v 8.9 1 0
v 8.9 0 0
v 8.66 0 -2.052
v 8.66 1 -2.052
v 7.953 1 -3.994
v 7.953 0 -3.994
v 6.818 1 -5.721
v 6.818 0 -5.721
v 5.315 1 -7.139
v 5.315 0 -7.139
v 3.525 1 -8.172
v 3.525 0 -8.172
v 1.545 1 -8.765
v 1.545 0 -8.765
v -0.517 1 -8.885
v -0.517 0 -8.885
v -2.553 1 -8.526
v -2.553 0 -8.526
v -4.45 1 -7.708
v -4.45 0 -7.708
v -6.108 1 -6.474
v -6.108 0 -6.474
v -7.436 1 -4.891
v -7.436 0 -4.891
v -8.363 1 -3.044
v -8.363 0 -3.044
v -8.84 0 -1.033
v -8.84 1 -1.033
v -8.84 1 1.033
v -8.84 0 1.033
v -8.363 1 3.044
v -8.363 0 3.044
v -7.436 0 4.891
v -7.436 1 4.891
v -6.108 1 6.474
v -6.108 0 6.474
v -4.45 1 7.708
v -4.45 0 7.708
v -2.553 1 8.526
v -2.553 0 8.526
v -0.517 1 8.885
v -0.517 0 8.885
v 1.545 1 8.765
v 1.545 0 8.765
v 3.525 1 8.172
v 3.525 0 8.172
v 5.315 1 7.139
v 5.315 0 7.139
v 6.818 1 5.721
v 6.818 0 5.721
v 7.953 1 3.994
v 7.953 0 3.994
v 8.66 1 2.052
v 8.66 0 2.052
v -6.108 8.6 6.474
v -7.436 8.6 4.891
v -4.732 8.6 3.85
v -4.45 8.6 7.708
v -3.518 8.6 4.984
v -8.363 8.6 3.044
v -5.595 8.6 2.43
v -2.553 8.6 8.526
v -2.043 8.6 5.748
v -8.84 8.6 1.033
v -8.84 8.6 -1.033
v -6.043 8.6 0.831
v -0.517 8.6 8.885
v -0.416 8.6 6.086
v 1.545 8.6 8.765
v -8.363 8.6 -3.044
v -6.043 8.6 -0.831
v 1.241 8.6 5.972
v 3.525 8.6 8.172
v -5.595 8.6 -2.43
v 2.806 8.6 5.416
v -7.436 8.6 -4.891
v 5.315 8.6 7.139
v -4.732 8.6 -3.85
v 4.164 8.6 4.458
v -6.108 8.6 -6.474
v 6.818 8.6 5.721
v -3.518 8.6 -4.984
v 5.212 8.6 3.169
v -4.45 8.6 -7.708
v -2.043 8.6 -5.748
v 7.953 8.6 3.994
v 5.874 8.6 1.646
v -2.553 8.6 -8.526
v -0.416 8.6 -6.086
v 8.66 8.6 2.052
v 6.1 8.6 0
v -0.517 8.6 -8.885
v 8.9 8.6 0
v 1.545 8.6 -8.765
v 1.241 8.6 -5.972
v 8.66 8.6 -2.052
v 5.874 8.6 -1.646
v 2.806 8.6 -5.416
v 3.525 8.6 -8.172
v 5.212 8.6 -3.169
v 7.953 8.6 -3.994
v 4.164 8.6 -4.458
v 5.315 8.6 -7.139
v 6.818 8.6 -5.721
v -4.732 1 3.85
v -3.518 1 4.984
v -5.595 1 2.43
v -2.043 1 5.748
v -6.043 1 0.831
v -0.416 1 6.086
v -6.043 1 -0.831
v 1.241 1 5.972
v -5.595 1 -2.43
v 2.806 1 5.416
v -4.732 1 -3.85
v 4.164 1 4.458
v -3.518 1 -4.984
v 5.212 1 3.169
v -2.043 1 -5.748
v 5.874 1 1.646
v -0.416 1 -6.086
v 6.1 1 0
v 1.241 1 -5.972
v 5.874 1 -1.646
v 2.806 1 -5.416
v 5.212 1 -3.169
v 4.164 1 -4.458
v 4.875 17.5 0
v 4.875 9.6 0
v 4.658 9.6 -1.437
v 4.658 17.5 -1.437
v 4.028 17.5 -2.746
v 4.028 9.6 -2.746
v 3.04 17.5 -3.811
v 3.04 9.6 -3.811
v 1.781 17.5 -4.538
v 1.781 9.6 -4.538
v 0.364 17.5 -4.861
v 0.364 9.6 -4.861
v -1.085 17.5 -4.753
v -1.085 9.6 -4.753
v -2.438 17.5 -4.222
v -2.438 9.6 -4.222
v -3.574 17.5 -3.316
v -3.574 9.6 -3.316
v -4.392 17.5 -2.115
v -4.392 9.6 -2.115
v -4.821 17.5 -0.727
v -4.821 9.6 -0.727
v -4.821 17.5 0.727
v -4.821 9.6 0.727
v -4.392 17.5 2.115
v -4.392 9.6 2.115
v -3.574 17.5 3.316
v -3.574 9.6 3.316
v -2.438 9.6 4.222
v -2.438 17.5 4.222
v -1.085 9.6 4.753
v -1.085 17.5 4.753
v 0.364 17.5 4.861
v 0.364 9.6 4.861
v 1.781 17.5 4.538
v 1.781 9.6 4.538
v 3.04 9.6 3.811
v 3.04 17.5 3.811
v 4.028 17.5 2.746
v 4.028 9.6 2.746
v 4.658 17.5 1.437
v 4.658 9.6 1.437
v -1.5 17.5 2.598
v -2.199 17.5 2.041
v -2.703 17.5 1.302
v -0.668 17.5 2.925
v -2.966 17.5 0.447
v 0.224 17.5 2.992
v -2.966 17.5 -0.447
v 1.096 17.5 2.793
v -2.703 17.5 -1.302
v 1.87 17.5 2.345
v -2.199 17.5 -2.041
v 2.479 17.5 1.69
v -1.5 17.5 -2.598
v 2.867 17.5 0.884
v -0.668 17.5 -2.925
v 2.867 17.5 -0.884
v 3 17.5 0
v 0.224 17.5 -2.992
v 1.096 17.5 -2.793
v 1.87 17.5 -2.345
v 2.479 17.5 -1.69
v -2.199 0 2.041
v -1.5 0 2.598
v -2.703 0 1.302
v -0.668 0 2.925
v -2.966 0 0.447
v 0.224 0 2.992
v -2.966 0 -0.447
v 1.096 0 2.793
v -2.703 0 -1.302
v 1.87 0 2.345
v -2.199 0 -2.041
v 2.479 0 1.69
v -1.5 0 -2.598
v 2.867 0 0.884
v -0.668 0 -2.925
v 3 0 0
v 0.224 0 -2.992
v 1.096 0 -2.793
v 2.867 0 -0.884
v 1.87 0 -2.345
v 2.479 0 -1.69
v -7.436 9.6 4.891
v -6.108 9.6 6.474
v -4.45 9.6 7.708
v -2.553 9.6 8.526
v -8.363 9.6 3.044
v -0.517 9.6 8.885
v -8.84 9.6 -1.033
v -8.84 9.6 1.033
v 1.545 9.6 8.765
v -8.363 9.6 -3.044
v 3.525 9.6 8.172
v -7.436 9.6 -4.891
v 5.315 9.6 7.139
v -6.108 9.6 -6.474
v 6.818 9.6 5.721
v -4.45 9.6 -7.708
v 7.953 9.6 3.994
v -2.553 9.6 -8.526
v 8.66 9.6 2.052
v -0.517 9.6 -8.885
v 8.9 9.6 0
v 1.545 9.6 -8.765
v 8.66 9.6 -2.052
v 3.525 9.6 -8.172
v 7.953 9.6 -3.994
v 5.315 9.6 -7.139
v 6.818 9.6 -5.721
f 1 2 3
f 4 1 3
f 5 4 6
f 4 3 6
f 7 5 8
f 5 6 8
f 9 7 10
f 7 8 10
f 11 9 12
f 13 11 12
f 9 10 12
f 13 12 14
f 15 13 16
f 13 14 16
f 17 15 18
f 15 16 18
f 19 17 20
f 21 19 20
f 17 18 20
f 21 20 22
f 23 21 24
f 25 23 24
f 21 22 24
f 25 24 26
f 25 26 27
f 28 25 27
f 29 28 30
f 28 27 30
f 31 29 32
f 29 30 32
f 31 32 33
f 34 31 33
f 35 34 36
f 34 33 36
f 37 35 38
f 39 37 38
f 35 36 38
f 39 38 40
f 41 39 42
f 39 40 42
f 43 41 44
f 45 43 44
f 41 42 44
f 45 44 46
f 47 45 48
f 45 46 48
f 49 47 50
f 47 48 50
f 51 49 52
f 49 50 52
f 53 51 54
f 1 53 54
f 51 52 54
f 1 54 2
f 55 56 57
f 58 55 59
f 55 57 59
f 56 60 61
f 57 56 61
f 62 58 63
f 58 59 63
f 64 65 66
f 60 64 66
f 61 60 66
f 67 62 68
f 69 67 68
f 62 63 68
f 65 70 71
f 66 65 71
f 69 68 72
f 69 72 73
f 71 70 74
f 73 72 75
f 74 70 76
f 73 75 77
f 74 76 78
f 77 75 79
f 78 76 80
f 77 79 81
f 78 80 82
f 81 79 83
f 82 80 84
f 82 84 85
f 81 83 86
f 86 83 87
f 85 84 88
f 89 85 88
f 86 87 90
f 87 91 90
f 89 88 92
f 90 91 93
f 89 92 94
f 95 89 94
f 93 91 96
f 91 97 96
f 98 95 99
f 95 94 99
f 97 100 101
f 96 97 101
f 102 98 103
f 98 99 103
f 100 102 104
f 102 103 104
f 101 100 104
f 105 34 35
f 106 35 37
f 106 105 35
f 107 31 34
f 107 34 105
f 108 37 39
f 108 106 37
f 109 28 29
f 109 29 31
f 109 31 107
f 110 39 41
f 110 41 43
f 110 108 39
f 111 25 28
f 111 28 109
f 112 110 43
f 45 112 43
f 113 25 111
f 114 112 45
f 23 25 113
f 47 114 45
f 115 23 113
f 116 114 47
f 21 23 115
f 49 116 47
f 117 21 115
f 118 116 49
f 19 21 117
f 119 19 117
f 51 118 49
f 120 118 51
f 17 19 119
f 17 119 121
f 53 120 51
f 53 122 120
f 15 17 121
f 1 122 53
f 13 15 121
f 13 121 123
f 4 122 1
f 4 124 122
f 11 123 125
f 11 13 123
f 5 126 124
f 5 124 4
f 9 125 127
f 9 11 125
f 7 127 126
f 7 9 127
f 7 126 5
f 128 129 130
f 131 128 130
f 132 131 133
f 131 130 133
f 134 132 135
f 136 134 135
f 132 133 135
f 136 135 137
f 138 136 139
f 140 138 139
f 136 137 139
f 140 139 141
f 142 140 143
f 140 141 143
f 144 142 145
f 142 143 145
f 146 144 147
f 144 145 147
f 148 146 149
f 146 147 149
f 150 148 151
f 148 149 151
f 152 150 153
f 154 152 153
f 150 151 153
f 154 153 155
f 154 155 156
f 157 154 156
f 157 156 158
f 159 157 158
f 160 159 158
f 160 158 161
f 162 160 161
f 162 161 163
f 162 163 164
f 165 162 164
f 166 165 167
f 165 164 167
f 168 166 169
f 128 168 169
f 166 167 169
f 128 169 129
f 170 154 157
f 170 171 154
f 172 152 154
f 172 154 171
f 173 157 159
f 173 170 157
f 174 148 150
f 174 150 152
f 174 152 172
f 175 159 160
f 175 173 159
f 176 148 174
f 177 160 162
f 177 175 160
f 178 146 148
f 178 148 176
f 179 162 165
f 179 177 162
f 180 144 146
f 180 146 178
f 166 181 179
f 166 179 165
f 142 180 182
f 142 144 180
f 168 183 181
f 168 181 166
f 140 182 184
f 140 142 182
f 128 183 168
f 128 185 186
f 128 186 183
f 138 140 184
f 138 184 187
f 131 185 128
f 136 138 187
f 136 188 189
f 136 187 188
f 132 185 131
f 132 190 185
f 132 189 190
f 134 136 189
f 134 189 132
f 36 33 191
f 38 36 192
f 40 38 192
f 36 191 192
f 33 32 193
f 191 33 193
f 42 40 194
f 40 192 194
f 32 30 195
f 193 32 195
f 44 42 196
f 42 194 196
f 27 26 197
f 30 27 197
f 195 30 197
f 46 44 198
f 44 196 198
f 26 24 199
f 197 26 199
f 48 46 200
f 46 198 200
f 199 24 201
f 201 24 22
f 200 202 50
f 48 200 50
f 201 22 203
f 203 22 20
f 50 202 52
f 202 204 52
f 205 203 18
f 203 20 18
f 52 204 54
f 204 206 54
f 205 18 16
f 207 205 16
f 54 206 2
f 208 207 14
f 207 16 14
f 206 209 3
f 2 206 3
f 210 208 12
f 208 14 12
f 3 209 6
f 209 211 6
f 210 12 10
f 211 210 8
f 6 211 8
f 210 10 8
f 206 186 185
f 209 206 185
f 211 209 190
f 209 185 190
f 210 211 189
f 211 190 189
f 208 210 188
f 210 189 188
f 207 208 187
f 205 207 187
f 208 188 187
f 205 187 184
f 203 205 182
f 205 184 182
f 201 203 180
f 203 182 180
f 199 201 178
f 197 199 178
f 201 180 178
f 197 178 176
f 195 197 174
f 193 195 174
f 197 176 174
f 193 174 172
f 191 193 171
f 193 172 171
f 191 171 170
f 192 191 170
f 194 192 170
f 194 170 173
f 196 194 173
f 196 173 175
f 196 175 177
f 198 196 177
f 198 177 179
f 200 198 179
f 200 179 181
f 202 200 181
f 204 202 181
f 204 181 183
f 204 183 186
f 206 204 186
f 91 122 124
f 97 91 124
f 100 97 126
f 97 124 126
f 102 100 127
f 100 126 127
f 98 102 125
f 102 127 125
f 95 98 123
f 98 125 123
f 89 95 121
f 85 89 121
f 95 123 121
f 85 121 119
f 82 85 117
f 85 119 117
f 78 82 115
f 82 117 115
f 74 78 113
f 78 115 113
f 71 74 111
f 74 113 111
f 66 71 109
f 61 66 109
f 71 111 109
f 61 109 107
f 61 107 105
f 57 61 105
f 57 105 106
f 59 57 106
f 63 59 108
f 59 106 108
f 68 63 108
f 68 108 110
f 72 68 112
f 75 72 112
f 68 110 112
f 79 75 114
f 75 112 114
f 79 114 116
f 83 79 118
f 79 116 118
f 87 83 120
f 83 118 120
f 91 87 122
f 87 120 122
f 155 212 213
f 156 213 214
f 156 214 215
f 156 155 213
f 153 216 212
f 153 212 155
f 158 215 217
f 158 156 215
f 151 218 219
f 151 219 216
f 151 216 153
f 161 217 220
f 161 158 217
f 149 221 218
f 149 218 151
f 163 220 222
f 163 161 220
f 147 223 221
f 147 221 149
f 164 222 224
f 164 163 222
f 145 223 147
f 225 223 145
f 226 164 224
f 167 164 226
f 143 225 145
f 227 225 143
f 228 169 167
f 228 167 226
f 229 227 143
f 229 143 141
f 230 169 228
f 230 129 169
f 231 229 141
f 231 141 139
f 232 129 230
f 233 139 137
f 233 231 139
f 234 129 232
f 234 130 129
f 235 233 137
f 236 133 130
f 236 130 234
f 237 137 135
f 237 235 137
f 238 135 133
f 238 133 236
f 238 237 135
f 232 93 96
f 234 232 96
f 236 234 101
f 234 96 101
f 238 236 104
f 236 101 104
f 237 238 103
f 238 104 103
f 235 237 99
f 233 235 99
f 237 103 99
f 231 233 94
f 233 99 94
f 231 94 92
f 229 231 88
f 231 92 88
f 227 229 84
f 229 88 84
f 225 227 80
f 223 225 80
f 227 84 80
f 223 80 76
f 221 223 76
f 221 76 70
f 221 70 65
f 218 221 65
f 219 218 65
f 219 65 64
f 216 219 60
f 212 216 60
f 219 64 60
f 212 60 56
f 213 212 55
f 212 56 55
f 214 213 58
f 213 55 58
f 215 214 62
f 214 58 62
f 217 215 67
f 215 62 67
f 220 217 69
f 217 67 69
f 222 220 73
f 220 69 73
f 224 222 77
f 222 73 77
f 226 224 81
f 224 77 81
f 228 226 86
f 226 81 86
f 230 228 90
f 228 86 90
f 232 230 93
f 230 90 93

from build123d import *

# Parameters (mm, degrees)
SKETCH1_R           = 8.9
BOSS_EXTRUDE1_DEPTH = 1
SKETCH2_R           = 6.1
BOSS_EXTRUDE2_DEPTH = 7.6
SKETCH3_R           = 8.9
BOSS_EXTRUDE3_DEPTH = 1
SKETCH4_R           = 4.875
BOSS_EXTRUDE4_DEPTH = 7.9
CUT_EXTRUDE1_REACH  = 19.5
SKETCH5_R           = 3


with BuildPart() as part:
    # Sketch1 → Boss-Extrude1 (new body)
    with BuildSketch(Plane(origin=(0, 0, 0), x_dir=(1, 0, 0), z_dir=(0, 1, 0))):
        Circle(SKETCH1_R)
    extrude(amount=BOSS_EXTRUDE1_DEPTH)

    # Sketch2 → Boss-Extrude2 (add)
    with BuildSketch(Plane(origin=(0, 1, 0), x_dir=(1, 0, 0), z_dir=(0, 1, 0))):
        Circle(SKETCH2_R)
    extrude(amount=BOSS_EXTRUDE2_DEPTH)

    # Sketch3 → Boss-Extrude3 (add)
    with BuildSketch(Plane(origin=(0, 8.6, 0), x_dir=(1, 0, 0), z_dir=(0, 1, 0))):
        Circle(SKETCH3_R)
    extrude(amount=BOSS_EXTRUDE3_DEPTH)

    # Sketch4 → Boss-Extrude4 (add)
    with BuildSketch(Plane(origin=(0, 9.6, 0), x_dir=(1, 0, 0), z_dir=(0, 1, 0))):
        Circle(SKETCH4_R)
    extrude(amount=BOSS_EXTRUDE4_DEPTH)

    # Sketch5 → Cut-Extrude1 (cut, up to next)
    with BuildSketch(Plane(origin=(0, 17.5, 0), x_dir=(1, 0, 0), z_dir=(0, 1, 0)), mode=Mode.PRIVATE) as cut_extrude1_sk1:
        Circle(SKETCH5_R)
    cut_extrude1_tool1 = extrude(cut_extrude1_sk1.sketch, amount=-CUT_EXTRUDE1_REACH, mode=Mode.PRIVATE) & part.part
    add(cut_extrude1_tool1.solids().sort_by_distance((0, 17.5, 0))[0], mode=Mode.SUBTRACT)


solid = part.part
